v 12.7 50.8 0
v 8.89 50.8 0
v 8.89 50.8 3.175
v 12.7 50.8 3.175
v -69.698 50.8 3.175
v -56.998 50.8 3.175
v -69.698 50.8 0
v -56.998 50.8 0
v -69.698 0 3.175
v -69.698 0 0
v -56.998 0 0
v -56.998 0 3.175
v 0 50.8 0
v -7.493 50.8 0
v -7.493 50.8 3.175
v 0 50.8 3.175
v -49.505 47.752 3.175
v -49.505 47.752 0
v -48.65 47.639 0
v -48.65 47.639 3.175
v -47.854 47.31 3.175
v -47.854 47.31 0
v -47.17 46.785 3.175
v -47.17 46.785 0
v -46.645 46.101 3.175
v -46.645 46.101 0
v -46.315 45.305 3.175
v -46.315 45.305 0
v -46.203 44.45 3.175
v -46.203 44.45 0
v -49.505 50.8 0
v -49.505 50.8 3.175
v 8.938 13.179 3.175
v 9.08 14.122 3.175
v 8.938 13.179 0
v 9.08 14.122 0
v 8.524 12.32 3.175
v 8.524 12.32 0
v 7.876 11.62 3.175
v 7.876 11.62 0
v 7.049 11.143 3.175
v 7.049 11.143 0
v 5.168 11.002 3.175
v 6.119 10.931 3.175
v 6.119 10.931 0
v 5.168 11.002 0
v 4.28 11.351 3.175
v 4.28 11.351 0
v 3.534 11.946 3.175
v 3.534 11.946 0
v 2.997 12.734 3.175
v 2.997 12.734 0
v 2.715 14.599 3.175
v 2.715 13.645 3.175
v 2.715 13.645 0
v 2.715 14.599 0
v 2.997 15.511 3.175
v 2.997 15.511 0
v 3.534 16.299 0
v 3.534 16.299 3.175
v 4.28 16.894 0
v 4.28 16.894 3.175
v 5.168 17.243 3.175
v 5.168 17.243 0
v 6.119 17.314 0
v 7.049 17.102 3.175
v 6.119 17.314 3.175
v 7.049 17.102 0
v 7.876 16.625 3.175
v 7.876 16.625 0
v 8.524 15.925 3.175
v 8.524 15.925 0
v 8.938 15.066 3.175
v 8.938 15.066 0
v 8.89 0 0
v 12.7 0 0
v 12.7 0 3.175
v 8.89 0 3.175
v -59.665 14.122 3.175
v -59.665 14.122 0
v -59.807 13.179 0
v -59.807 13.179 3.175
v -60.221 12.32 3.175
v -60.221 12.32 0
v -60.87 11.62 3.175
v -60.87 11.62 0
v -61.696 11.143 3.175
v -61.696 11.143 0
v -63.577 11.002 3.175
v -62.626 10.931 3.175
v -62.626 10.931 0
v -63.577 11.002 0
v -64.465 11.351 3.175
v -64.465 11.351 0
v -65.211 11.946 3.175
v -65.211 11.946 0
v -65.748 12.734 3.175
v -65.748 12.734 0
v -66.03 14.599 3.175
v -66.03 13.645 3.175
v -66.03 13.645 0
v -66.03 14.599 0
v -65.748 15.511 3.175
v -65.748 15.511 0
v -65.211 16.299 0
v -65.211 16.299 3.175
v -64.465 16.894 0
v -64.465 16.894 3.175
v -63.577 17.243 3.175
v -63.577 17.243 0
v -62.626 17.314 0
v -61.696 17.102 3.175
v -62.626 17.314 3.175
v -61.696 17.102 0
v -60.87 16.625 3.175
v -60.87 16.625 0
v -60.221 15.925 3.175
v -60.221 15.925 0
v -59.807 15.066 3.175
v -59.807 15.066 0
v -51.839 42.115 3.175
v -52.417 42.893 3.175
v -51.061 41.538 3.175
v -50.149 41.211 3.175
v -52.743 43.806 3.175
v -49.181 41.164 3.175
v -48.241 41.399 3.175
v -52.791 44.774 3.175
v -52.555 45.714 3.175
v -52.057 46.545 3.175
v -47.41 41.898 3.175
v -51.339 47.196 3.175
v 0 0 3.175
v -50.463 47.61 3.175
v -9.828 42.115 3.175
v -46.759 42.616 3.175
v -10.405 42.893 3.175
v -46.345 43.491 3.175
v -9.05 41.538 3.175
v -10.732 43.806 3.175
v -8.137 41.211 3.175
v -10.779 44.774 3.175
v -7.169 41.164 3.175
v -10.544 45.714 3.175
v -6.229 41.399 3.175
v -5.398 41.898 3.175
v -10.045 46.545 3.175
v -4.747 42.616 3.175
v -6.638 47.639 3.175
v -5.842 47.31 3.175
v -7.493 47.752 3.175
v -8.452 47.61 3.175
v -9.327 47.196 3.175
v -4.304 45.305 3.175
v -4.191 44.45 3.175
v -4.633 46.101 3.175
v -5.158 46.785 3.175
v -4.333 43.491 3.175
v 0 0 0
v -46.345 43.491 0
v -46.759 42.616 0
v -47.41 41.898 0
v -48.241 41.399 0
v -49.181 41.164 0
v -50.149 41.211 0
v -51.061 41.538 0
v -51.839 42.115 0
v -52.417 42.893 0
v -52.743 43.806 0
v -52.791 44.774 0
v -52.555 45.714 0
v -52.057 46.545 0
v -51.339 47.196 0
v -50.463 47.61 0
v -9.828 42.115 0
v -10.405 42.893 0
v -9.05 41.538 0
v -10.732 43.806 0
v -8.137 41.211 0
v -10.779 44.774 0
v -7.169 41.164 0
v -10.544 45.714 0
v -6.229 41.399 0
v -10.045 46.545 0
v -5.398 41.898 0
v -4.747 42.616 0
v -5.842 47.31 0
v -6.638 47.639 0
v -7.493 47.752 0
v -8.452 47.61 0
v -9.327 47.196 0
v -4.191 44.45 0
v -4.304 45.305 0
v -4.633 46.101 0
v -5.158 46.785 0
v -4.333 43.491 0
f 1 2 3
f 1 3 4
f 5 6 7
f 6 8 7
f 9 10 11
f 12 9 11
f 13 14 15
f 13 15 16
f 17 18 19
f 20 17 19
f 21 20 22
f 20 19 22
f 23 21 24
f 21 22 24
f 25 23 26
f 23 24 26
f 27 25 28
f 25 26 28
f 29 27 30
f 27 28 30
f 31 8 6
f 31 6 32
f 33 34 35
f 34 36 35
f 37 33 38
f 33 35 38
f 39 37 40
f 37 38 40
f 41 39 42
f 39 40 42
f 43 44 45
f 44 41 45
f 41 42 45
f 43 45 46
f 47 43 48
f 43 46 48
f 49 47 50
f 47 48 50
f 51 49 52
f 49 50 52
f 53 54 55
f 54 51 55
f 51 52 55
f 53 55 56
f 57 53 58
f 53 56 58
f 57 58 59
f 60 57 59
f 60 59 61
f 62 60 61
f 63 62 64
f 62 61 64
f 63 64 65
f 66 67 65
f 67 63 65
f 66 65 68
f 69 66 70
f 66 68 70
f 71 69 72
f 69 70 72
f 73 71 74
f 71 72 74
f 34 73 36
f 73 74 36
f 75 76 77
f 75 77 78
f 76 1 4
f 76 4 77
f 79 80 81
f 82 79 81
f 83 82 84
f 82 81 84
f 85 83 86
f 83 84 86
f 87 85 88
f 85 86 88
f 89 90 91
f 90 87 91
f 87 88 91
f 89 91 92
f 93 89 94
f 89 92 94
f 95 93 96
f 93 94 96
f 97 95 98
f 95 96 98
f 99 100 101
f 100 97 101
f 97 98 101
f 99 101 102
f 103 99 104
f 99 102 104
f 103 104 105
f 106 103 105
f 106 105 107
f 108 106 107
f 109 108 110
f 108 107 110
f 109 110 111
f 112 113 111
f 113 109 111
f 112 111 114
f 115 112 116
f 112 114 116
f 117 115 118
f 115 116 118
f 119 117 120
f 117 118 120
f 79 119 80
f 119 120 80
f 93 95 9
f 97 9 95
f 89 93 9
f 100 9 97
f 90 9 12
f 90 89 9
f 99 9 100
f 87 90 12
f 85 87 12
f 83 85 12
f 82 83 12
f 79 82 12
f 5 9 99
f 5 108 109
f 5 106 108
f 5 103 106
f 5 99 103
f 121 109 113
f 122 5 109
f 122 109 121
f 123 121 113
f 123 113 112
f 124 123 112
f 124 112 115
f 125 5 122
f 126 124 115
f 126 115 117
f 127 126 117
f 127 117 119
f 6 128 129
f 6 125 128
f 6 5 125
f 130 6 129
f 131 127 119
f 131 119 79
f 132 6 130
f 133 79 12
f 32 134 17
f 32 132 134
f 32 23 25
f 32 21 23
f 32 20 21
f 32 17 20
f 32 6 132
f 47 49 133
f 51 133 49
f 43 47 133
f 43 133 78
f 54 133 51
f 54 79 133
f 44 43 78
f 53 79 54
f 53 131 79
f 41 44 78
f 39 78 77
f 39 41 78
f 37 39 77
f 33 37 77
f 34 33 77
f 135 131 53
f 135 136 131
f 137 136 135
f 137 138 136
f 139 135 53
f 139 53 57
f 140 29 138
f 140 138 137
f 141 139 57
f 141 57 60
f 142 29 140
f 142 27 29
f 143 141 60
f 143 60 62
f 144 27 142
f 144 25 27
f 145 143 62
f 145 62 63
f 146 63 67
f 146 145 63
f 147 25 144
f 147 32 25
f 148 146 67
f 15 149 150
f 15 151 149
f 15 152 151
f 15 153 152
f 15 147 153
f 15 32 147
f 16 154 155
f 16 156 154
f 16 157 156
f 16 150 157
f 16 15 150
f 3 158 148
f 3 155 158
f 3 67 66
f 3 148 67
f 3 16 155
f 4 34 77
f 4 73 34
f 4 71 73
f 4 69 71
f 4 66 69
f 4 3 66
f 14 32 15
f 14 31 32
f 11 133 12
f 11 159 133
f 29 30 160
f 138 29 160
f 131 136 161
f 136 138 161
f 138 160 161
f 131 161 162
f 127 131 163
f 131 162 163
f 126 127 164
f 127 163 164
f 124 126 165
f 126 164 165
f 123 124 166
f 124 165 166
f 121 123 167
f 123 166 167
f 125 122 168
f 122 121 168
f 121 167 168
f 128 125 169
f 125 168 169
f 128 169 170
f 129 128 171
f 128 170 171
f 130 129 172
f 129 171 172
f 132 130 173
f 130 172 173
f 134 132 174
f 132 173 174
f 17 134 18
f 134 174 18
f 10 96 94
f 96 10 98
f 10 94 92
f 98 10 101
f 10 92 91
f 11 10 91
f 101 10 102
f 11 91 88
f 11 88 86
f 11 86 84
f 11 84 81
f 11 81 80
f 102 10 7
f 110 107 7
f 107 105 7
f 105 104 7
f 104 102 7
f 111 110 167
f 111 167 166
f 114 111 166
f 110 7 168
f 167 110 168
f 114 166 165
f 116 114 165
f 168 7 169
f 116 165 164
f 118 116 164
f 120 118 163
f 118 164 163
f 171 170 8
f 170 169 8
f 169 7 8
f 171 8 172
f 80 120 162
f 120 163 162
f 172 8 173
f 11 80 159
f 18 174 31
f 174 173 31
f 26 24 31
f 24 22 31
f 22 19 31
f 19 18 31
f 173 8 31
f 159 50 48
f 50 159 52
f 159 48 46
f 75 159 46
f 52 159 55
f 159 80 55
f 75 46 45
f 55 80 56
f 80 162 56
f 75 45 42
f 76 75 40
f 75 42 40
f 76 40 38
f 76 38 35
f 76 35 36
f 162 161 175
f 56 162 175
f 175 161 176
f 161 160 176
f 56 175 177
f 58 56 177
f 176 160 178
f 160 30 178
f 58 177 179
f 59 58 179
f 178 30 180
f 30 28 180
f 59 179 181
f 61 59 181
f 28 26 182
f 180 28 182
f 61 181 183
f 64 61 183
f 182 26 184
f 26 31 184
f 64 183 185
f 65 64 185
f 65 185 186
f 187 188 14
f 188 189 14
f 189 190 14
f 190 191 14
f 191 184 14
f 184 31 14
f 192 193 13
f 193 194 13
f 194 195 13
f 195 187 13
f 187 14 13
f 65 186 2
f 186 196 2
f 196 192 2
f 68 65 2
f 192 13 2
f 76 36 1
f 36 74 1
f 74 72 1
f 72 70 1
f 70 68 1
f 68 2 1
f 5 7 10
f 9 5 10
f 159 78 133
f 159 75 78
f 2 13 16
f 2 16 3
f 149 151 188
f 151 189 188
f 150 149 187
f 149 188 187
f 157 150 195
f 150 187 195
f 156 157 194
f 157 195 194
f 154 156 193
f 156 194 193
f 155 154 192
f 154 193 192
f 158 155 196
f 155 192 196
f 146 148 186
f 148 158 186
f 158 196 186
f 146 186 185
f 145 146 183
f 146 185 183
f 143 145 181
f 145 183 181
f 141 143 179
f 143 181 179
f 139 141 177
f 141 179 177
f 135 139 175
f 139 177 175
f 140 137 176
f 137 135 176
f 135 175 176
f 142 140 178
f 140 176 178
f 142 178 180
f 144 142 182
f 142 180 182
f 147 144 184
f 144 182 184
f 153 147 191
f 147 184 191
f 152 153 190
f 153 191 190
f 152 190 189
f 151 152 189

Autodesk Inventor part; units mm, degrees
ref_plane "YZ Plane" through (0, 0, 0) normal (1, 0, 0) x (0, 1, 0)
ref_plane "XZ Plane" through (0, 0, 0) normal (0, 1, 0) x (-1, 0, 0)
ref_plane "XY Plane" through (0, 0, 0) normal (0, 0, 1) x (1, 0, 0)
sketch "Sketch1" plane through (0, 0, 0) normal (0, 0, 1) x (1, 0, 0)
  line L0 (0, 0) -> (-56.9976, 0)
  line L1 (-56.9976, 50.8) -> (0, 50.8)
  line L2 (0, 50.8) -> (-7.493, 50.8)
  line L3 (-7.493, 50.8) -> (-7.493, 44.45)
  line L4 (-56.9976, 50.8) -> (-49.5046, 50.8)
  line L5 (-49.5046, 50.8) -> (-49.5046, 44.45)
  circle A0 centre (-49.5046, 44.45) radius 3.302
  circle A1 centre (-7.493, 44.45) radius 3.302
  circle A2 centre (-62.865, 14.1224) radius 3.2004
  circle A3 centre (5.8801, 14.1224) radius 3.2004
  line L6 (-56.9976, 50.8) -> (-69.6976, 50.8)
  line L7 (-69.6976, 50.8) -> (-69.6976, 0)
  line L8 (-69.6976, 0) -> (-56.9976, 0)
  line L9 (0, 50.8) -> (8.89, 50.8)
  line L10 (8.89, 0) -> (0, 0)
  line L11 (0, 50.8) -> (12.7, 50.8)
  line L12 (12.7, 50.8) -> (12.7, 0)
  line L13 (12.7, 0) -> (0, 0)
  dimension "d1" = 56.9976
  dimension "d2" = 50.8
  dimension "d3" = 7.493
  dimension "d4" = 6.35
  dimension "d5" = 7.493
  dimension "d6" = 6.604
  dimension "d7" = 6.604
  dimension "d19" = 6.35
  dimension "d46" = 6.4008
  dimension "d47" = 6.4008
  dimension "d48" = 12.7
  dimension "d51" = 50.8
  dimension "d53" = 36.6776
  dimension "d55" = 36.6776
  dimension "d57" = 12.7
  dimension "d58" = 6.8199
  dimension "d59" = 6.8326
extrude "Plate5" add sketch "Sketch1" along normal blind 3.175
equation "\"BendRadius\" = Thickness"
equation "\"BendReliefWidth\" = Thickness"
equation "\"BendReliefDepth\" = 0.5 * Thickness"
equation "\"CornerReliefSize\" = 4 * Thickness"
equation "\"MinimumRemnant\" = 2 * Thickness"
equation "\"TransitionRadius\" = BendRadius"
equation "\"JacobiRadiusSize\" = BendRadius"
equation "\"GapSize\" = Thickness"
equation "\"d8\" = BendRadius"
equation "\"d56\" = BendRadius"
equation "\"Thickness\" = 3.175"
properties part number "face mount" material "Aluminum 6061"
